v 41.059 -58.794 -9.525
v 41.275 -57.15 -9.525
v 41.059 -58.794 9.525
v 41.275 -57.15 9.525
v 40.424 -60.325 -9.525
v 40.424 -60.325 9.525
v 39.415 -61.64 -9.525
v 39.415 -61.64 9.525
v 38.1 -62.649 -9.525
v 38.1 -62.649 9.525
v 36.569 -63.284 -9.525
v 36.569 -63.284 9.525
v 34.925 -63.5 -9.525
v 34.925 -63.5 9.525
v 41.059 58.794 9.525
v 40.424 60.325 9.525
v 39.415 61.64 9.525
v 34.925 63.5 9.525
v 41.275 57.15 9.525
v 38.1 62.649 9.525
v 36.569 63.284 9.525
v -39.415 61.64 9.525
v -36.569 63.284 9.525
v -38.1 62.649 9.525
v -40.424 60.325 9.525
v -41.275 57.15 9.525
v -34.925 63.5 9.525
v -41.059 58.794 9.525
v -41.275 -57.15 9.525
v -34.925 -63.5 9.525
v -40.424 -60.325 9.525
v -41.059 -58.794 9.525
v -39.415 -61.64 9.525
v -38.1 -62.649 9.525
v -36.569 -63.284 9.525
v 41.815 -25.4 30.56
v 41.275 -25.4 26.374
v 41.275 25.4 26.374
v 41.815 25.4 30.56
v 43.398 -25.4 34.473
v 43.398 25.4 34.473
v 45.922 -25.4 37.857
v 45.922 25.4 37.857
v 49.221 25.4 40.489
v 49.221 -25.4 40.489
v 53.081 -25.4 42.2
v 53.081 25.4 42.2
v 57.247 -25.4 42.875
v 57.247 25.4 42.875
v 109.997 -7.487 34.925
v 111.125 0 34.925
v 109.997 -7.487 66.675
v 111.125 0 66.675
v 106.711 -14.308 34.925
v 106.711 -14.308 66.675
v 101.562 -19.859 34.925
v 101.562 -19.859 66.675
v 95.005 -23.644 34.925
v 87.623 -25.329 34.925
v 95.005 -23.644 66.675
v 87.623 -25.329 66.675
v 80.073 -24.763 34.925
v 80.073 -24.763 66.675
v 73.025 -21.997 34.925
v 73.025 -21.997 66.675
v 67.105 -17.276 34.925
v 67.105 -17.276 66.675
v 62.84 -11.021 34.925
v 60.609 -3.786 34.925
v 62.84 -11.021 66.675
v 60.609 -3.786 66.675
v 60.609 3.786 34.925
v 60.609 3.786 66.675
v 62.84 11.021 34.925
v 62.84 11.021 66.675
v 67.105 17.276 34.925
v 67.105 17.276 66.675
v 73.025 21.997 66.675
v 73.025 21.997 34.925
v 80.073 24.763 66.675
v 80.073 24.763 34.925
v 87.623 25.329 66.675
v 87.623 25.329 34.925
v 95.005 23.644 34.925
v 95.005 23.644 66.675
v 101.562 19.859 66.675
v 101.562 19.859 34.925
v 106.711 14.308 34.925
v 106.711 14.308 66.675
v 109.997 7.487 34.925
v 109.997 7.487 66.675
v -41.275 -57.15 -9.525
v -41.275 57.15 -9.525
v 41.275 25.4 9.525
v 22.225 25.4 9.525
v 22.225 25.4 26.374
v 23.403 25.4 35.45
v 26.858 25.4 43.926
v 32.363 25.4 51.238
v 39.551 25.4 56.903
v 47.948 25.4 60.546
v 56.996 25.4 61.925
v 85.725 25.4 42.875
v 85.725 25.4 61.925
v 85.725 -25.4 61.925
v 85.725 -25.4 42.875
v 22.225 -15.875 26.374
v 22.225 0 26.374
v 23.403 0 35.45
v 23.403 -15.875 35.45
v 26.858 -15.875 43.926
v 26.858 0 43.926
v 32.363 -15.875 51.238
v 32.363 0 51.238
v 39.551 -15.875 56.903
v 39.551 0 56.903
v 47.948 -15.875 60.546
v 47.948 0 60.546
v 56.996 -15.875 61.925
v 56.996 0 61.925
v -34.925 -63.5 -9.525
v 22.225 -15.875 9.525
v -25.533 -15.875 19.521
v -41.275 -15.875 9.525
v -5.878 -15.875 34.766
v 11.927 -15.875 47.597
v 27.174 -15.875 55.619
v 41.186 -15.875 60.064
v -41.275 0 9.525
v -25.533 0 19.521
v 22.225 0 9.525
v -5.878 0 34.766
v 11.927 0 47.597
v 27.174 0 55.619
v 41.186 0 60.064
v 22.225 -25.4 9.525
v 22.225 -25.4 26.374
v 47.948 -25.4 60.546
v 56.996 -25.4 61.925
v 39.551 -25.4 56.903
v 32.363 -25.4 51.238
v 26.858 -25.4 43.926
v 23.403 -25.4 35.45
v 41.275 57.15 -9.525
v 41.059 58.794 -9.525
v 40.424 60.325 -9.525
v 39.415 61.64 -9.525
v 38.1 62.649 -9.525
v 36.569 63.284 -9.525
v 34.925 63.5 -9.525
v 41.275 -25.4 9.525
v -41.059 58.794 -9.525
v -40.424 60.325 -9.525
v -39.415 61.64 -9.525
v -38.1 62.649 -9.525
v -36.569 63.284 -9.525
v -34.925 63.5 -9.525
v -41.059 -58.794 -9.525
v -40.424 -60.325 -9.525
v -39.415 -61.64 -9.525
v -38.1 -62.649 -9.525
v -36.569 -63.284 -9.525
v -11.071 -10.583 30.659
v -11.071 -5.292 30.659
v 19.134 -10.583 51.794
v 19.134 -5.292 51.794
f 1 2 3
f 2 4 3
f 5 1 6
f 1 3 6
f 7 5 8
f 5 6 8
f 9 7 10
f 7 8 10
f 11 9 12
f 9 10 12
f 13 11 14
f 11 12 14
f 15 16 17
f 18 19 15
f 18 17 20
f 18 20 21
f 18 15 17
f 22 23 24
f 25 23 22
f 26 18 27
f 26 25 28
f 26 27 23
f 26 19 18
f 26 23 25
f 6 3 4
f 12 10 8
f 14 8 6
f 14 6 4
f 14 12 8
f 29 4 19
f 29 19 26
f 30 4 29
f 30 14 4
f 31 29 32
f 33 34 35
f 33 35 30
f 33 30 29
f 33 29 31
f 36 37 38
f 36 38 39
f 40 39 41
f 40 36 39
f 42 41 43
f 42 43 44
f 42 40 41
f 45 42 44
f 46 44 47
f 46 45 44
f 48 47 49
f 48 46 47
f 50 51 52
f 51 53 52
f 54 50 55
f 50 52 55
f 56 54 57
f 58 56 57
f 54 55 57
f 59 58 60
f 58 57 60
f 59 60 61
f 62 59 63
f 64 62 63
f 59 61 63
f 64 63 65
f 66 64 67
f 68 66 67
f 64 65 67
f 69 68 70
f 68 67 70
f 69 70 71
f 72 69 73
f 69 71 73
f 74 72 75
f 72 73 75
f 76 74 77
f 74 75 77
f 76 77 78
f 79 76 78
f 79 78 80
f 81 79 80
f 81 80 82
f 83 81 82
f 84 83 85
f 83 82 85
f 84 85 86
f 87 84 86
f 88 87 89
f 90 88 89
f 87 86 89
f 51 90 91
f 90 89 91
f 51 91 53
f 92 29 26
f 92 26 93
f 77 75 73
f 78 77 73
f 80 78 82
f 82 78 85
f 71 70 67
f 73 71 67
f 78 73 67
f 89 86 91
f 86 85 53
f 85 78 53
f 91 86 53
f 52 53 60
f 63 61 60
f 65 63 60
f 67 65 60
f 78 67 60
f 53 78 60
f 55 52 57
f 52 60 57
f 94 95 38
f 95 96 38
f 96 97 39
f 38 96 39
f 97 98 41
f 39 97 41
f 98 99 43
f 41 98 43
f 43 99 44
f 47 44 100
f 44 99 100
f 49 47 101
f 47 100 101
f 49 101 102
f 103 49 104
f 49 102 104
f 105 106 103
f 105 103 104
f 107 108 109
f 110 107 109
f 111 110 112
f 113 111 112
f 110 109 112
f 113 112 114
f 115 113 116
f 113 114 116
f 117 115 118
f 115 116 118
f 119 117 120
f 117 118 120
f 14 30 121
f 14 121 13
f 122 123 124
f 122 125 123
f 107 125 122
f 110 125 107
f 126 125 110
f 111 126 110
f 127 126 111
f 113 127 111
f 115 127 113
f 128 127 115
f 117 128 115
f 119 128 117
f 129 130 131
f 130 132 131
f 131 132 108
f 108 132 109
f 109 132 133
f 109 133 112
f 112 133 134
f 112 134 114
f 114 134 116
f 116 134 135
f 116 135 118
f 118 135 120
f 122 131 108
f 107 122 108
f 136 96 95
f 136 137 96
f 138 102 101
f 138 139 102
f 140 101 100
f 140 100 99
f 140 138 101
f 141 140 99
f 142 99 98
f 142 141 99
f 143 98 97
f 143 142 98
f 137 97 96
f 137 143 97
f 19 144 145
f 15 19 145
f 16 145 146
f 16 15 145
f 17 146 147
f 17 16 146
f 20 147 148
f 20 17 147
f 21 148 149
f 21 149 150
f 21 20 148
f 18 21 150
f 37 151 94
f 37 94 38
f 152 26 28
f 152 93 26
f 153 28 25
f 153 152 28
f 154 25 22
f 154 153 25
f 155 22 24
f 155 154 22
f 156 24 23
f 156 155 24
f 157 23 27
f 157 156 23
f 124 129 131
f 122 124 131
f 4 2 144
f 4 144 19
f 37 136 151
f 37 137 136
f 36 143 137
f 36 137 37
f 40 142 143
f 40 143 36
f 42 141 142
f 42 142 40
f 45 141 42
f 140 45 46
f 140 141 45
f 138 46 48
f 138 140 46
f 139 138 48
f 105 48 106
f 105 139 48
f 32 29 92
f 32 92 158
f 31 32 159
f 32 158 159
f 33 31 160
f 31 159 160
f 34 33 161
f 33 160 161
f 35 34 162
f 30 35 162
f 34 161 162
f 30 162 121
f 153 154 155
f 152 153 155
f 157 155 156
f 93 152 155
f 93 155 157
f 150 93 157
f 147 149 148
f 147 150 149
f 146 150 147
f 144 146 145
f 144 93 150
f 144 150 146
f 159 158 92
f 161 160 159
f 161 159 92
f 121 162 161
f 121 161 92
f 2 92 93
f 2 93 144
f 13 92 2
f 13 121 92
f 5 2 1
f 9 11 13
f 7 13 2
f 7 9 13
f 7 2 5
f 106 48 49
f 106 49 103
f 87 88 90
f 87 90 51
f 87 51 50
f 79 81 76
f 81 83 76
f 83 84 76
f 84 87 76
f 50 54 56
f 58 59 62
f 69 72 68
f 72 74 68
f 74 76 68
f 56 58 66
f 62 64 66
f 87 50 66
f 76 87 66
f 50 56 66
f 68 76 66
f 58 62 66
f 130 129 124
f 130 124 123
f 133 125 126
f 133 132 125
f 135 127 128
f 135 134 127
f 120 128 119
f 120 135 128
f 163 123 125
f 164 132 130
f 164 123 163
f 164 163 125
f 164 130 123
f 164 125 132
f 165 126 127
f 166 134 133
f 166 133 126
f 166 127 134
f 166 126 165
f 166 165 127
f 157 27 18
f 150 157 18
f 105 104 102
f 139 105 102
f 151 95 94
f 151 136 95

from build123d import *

# Parameters (mm, degrees)
F3_DEPTH = 15.875
F0_W     = 25.4
F0_H     = 19.05
F4_DEPTH = 25.4
F5_DEPTH = 63.5
F6_R     = 6.35


with BuildPart() as f2:
    # F0 (on Front) → F2 (revolve)
    with BuildSketch(Plane.XZ):
        Polygon((85.725, 61.9252), (85.725, 42.8752), (85.725, 34.925), (111.125, 34.925), (111.125, 66.675), (85.725, 66.675), align=None)
    revolve(axis=Axis((85.725, 0, 50.8), (0, 0, -1)))


with BuildPart() as f3:
    # F0 (on Front) → F3 (new body)
    with BuildSketch(Plane.XZ):
        with BuildLine():
            Line((-41.275, 9.525), (22.225, 9.525))
            Line((22.225, 9.525), (22.225, 26.3739573205))
            ThreePointArc((22.225, 26.3739573205), (32.3628102484, 51.2381055712), (56.9958587309, 61.9252))
            add(Edge.make_bspline(
                [(-41.275, 9.525), (-8.5180470897, 26.9917333333), (12.7523746341, 60.962986201), (56.9958587309, 61.9252)],
                knots=[0, 0, 0, 0, 111.3684992974, 111.3684992974, 111.3684992974, 111.3684992974], degree=3))
        make_face()
    extrude(amount=F3_DEPTH)


with BuildPart() as f4:
    # F0 (on Front) → F4 (new body, symmetric)
    with BuildSketch(Plane.XZ):
        with BuildLine():
            Line((22.225, 9.525), (41.275, 9.525))
            Line((41.275, 9.525), (41.275, 26.3739573205))
            ThreePointArc((41.275, 26.3739573205), (45.9220946413, 37.8566214909), (57.2473290673, 42.8752))
            Line((57.2473290673, 42.8752), (60.325, 42.8752))
            Line((60.325, 42.8752), (60.325, 61.9252))
            Line((60.325, 61.9252), (56.9958587309, 61.9252))
            ThreePointArc((56.9958587309, 61.9252), (32.3628102484, 51.2381055712), (22.225, 26.3739573205))
            Line((22.225, 26.3739573205), (22.225, 9.525))
        make_face()
        with Locations((73.025, 52.4002)):
            Rectangle(F0_W, F0_H)
    extrude(amount=F4_DEPTH, both=True)


with BuildPart() as f5:
    # F0 (on Front) → F5 (new body, symmetric)
    with BuildSketch(Plane.XZ):
        Polygon((41.275, -9.525), (41.275, 9.525), (22.225, 9.525), (-41.275, 9.525), (-41.275, -9.525), align=None)
    extrude(amount=F5_DEPTH, both=True)

    # F6
    f6_edges = [f5.edges().sort_by_distance(p)[0] for p in [
        (41.275, -63.5, 0),
        (-41.275, -63.5, 0),
        (41.275, 63.5, 0),
        (-41.275, 63.5, 0),
    ]]
    fillet(f6_edges, radius=F6_R)


solid = Compound([f2.part, f3.part, f4.part, f5.part])
